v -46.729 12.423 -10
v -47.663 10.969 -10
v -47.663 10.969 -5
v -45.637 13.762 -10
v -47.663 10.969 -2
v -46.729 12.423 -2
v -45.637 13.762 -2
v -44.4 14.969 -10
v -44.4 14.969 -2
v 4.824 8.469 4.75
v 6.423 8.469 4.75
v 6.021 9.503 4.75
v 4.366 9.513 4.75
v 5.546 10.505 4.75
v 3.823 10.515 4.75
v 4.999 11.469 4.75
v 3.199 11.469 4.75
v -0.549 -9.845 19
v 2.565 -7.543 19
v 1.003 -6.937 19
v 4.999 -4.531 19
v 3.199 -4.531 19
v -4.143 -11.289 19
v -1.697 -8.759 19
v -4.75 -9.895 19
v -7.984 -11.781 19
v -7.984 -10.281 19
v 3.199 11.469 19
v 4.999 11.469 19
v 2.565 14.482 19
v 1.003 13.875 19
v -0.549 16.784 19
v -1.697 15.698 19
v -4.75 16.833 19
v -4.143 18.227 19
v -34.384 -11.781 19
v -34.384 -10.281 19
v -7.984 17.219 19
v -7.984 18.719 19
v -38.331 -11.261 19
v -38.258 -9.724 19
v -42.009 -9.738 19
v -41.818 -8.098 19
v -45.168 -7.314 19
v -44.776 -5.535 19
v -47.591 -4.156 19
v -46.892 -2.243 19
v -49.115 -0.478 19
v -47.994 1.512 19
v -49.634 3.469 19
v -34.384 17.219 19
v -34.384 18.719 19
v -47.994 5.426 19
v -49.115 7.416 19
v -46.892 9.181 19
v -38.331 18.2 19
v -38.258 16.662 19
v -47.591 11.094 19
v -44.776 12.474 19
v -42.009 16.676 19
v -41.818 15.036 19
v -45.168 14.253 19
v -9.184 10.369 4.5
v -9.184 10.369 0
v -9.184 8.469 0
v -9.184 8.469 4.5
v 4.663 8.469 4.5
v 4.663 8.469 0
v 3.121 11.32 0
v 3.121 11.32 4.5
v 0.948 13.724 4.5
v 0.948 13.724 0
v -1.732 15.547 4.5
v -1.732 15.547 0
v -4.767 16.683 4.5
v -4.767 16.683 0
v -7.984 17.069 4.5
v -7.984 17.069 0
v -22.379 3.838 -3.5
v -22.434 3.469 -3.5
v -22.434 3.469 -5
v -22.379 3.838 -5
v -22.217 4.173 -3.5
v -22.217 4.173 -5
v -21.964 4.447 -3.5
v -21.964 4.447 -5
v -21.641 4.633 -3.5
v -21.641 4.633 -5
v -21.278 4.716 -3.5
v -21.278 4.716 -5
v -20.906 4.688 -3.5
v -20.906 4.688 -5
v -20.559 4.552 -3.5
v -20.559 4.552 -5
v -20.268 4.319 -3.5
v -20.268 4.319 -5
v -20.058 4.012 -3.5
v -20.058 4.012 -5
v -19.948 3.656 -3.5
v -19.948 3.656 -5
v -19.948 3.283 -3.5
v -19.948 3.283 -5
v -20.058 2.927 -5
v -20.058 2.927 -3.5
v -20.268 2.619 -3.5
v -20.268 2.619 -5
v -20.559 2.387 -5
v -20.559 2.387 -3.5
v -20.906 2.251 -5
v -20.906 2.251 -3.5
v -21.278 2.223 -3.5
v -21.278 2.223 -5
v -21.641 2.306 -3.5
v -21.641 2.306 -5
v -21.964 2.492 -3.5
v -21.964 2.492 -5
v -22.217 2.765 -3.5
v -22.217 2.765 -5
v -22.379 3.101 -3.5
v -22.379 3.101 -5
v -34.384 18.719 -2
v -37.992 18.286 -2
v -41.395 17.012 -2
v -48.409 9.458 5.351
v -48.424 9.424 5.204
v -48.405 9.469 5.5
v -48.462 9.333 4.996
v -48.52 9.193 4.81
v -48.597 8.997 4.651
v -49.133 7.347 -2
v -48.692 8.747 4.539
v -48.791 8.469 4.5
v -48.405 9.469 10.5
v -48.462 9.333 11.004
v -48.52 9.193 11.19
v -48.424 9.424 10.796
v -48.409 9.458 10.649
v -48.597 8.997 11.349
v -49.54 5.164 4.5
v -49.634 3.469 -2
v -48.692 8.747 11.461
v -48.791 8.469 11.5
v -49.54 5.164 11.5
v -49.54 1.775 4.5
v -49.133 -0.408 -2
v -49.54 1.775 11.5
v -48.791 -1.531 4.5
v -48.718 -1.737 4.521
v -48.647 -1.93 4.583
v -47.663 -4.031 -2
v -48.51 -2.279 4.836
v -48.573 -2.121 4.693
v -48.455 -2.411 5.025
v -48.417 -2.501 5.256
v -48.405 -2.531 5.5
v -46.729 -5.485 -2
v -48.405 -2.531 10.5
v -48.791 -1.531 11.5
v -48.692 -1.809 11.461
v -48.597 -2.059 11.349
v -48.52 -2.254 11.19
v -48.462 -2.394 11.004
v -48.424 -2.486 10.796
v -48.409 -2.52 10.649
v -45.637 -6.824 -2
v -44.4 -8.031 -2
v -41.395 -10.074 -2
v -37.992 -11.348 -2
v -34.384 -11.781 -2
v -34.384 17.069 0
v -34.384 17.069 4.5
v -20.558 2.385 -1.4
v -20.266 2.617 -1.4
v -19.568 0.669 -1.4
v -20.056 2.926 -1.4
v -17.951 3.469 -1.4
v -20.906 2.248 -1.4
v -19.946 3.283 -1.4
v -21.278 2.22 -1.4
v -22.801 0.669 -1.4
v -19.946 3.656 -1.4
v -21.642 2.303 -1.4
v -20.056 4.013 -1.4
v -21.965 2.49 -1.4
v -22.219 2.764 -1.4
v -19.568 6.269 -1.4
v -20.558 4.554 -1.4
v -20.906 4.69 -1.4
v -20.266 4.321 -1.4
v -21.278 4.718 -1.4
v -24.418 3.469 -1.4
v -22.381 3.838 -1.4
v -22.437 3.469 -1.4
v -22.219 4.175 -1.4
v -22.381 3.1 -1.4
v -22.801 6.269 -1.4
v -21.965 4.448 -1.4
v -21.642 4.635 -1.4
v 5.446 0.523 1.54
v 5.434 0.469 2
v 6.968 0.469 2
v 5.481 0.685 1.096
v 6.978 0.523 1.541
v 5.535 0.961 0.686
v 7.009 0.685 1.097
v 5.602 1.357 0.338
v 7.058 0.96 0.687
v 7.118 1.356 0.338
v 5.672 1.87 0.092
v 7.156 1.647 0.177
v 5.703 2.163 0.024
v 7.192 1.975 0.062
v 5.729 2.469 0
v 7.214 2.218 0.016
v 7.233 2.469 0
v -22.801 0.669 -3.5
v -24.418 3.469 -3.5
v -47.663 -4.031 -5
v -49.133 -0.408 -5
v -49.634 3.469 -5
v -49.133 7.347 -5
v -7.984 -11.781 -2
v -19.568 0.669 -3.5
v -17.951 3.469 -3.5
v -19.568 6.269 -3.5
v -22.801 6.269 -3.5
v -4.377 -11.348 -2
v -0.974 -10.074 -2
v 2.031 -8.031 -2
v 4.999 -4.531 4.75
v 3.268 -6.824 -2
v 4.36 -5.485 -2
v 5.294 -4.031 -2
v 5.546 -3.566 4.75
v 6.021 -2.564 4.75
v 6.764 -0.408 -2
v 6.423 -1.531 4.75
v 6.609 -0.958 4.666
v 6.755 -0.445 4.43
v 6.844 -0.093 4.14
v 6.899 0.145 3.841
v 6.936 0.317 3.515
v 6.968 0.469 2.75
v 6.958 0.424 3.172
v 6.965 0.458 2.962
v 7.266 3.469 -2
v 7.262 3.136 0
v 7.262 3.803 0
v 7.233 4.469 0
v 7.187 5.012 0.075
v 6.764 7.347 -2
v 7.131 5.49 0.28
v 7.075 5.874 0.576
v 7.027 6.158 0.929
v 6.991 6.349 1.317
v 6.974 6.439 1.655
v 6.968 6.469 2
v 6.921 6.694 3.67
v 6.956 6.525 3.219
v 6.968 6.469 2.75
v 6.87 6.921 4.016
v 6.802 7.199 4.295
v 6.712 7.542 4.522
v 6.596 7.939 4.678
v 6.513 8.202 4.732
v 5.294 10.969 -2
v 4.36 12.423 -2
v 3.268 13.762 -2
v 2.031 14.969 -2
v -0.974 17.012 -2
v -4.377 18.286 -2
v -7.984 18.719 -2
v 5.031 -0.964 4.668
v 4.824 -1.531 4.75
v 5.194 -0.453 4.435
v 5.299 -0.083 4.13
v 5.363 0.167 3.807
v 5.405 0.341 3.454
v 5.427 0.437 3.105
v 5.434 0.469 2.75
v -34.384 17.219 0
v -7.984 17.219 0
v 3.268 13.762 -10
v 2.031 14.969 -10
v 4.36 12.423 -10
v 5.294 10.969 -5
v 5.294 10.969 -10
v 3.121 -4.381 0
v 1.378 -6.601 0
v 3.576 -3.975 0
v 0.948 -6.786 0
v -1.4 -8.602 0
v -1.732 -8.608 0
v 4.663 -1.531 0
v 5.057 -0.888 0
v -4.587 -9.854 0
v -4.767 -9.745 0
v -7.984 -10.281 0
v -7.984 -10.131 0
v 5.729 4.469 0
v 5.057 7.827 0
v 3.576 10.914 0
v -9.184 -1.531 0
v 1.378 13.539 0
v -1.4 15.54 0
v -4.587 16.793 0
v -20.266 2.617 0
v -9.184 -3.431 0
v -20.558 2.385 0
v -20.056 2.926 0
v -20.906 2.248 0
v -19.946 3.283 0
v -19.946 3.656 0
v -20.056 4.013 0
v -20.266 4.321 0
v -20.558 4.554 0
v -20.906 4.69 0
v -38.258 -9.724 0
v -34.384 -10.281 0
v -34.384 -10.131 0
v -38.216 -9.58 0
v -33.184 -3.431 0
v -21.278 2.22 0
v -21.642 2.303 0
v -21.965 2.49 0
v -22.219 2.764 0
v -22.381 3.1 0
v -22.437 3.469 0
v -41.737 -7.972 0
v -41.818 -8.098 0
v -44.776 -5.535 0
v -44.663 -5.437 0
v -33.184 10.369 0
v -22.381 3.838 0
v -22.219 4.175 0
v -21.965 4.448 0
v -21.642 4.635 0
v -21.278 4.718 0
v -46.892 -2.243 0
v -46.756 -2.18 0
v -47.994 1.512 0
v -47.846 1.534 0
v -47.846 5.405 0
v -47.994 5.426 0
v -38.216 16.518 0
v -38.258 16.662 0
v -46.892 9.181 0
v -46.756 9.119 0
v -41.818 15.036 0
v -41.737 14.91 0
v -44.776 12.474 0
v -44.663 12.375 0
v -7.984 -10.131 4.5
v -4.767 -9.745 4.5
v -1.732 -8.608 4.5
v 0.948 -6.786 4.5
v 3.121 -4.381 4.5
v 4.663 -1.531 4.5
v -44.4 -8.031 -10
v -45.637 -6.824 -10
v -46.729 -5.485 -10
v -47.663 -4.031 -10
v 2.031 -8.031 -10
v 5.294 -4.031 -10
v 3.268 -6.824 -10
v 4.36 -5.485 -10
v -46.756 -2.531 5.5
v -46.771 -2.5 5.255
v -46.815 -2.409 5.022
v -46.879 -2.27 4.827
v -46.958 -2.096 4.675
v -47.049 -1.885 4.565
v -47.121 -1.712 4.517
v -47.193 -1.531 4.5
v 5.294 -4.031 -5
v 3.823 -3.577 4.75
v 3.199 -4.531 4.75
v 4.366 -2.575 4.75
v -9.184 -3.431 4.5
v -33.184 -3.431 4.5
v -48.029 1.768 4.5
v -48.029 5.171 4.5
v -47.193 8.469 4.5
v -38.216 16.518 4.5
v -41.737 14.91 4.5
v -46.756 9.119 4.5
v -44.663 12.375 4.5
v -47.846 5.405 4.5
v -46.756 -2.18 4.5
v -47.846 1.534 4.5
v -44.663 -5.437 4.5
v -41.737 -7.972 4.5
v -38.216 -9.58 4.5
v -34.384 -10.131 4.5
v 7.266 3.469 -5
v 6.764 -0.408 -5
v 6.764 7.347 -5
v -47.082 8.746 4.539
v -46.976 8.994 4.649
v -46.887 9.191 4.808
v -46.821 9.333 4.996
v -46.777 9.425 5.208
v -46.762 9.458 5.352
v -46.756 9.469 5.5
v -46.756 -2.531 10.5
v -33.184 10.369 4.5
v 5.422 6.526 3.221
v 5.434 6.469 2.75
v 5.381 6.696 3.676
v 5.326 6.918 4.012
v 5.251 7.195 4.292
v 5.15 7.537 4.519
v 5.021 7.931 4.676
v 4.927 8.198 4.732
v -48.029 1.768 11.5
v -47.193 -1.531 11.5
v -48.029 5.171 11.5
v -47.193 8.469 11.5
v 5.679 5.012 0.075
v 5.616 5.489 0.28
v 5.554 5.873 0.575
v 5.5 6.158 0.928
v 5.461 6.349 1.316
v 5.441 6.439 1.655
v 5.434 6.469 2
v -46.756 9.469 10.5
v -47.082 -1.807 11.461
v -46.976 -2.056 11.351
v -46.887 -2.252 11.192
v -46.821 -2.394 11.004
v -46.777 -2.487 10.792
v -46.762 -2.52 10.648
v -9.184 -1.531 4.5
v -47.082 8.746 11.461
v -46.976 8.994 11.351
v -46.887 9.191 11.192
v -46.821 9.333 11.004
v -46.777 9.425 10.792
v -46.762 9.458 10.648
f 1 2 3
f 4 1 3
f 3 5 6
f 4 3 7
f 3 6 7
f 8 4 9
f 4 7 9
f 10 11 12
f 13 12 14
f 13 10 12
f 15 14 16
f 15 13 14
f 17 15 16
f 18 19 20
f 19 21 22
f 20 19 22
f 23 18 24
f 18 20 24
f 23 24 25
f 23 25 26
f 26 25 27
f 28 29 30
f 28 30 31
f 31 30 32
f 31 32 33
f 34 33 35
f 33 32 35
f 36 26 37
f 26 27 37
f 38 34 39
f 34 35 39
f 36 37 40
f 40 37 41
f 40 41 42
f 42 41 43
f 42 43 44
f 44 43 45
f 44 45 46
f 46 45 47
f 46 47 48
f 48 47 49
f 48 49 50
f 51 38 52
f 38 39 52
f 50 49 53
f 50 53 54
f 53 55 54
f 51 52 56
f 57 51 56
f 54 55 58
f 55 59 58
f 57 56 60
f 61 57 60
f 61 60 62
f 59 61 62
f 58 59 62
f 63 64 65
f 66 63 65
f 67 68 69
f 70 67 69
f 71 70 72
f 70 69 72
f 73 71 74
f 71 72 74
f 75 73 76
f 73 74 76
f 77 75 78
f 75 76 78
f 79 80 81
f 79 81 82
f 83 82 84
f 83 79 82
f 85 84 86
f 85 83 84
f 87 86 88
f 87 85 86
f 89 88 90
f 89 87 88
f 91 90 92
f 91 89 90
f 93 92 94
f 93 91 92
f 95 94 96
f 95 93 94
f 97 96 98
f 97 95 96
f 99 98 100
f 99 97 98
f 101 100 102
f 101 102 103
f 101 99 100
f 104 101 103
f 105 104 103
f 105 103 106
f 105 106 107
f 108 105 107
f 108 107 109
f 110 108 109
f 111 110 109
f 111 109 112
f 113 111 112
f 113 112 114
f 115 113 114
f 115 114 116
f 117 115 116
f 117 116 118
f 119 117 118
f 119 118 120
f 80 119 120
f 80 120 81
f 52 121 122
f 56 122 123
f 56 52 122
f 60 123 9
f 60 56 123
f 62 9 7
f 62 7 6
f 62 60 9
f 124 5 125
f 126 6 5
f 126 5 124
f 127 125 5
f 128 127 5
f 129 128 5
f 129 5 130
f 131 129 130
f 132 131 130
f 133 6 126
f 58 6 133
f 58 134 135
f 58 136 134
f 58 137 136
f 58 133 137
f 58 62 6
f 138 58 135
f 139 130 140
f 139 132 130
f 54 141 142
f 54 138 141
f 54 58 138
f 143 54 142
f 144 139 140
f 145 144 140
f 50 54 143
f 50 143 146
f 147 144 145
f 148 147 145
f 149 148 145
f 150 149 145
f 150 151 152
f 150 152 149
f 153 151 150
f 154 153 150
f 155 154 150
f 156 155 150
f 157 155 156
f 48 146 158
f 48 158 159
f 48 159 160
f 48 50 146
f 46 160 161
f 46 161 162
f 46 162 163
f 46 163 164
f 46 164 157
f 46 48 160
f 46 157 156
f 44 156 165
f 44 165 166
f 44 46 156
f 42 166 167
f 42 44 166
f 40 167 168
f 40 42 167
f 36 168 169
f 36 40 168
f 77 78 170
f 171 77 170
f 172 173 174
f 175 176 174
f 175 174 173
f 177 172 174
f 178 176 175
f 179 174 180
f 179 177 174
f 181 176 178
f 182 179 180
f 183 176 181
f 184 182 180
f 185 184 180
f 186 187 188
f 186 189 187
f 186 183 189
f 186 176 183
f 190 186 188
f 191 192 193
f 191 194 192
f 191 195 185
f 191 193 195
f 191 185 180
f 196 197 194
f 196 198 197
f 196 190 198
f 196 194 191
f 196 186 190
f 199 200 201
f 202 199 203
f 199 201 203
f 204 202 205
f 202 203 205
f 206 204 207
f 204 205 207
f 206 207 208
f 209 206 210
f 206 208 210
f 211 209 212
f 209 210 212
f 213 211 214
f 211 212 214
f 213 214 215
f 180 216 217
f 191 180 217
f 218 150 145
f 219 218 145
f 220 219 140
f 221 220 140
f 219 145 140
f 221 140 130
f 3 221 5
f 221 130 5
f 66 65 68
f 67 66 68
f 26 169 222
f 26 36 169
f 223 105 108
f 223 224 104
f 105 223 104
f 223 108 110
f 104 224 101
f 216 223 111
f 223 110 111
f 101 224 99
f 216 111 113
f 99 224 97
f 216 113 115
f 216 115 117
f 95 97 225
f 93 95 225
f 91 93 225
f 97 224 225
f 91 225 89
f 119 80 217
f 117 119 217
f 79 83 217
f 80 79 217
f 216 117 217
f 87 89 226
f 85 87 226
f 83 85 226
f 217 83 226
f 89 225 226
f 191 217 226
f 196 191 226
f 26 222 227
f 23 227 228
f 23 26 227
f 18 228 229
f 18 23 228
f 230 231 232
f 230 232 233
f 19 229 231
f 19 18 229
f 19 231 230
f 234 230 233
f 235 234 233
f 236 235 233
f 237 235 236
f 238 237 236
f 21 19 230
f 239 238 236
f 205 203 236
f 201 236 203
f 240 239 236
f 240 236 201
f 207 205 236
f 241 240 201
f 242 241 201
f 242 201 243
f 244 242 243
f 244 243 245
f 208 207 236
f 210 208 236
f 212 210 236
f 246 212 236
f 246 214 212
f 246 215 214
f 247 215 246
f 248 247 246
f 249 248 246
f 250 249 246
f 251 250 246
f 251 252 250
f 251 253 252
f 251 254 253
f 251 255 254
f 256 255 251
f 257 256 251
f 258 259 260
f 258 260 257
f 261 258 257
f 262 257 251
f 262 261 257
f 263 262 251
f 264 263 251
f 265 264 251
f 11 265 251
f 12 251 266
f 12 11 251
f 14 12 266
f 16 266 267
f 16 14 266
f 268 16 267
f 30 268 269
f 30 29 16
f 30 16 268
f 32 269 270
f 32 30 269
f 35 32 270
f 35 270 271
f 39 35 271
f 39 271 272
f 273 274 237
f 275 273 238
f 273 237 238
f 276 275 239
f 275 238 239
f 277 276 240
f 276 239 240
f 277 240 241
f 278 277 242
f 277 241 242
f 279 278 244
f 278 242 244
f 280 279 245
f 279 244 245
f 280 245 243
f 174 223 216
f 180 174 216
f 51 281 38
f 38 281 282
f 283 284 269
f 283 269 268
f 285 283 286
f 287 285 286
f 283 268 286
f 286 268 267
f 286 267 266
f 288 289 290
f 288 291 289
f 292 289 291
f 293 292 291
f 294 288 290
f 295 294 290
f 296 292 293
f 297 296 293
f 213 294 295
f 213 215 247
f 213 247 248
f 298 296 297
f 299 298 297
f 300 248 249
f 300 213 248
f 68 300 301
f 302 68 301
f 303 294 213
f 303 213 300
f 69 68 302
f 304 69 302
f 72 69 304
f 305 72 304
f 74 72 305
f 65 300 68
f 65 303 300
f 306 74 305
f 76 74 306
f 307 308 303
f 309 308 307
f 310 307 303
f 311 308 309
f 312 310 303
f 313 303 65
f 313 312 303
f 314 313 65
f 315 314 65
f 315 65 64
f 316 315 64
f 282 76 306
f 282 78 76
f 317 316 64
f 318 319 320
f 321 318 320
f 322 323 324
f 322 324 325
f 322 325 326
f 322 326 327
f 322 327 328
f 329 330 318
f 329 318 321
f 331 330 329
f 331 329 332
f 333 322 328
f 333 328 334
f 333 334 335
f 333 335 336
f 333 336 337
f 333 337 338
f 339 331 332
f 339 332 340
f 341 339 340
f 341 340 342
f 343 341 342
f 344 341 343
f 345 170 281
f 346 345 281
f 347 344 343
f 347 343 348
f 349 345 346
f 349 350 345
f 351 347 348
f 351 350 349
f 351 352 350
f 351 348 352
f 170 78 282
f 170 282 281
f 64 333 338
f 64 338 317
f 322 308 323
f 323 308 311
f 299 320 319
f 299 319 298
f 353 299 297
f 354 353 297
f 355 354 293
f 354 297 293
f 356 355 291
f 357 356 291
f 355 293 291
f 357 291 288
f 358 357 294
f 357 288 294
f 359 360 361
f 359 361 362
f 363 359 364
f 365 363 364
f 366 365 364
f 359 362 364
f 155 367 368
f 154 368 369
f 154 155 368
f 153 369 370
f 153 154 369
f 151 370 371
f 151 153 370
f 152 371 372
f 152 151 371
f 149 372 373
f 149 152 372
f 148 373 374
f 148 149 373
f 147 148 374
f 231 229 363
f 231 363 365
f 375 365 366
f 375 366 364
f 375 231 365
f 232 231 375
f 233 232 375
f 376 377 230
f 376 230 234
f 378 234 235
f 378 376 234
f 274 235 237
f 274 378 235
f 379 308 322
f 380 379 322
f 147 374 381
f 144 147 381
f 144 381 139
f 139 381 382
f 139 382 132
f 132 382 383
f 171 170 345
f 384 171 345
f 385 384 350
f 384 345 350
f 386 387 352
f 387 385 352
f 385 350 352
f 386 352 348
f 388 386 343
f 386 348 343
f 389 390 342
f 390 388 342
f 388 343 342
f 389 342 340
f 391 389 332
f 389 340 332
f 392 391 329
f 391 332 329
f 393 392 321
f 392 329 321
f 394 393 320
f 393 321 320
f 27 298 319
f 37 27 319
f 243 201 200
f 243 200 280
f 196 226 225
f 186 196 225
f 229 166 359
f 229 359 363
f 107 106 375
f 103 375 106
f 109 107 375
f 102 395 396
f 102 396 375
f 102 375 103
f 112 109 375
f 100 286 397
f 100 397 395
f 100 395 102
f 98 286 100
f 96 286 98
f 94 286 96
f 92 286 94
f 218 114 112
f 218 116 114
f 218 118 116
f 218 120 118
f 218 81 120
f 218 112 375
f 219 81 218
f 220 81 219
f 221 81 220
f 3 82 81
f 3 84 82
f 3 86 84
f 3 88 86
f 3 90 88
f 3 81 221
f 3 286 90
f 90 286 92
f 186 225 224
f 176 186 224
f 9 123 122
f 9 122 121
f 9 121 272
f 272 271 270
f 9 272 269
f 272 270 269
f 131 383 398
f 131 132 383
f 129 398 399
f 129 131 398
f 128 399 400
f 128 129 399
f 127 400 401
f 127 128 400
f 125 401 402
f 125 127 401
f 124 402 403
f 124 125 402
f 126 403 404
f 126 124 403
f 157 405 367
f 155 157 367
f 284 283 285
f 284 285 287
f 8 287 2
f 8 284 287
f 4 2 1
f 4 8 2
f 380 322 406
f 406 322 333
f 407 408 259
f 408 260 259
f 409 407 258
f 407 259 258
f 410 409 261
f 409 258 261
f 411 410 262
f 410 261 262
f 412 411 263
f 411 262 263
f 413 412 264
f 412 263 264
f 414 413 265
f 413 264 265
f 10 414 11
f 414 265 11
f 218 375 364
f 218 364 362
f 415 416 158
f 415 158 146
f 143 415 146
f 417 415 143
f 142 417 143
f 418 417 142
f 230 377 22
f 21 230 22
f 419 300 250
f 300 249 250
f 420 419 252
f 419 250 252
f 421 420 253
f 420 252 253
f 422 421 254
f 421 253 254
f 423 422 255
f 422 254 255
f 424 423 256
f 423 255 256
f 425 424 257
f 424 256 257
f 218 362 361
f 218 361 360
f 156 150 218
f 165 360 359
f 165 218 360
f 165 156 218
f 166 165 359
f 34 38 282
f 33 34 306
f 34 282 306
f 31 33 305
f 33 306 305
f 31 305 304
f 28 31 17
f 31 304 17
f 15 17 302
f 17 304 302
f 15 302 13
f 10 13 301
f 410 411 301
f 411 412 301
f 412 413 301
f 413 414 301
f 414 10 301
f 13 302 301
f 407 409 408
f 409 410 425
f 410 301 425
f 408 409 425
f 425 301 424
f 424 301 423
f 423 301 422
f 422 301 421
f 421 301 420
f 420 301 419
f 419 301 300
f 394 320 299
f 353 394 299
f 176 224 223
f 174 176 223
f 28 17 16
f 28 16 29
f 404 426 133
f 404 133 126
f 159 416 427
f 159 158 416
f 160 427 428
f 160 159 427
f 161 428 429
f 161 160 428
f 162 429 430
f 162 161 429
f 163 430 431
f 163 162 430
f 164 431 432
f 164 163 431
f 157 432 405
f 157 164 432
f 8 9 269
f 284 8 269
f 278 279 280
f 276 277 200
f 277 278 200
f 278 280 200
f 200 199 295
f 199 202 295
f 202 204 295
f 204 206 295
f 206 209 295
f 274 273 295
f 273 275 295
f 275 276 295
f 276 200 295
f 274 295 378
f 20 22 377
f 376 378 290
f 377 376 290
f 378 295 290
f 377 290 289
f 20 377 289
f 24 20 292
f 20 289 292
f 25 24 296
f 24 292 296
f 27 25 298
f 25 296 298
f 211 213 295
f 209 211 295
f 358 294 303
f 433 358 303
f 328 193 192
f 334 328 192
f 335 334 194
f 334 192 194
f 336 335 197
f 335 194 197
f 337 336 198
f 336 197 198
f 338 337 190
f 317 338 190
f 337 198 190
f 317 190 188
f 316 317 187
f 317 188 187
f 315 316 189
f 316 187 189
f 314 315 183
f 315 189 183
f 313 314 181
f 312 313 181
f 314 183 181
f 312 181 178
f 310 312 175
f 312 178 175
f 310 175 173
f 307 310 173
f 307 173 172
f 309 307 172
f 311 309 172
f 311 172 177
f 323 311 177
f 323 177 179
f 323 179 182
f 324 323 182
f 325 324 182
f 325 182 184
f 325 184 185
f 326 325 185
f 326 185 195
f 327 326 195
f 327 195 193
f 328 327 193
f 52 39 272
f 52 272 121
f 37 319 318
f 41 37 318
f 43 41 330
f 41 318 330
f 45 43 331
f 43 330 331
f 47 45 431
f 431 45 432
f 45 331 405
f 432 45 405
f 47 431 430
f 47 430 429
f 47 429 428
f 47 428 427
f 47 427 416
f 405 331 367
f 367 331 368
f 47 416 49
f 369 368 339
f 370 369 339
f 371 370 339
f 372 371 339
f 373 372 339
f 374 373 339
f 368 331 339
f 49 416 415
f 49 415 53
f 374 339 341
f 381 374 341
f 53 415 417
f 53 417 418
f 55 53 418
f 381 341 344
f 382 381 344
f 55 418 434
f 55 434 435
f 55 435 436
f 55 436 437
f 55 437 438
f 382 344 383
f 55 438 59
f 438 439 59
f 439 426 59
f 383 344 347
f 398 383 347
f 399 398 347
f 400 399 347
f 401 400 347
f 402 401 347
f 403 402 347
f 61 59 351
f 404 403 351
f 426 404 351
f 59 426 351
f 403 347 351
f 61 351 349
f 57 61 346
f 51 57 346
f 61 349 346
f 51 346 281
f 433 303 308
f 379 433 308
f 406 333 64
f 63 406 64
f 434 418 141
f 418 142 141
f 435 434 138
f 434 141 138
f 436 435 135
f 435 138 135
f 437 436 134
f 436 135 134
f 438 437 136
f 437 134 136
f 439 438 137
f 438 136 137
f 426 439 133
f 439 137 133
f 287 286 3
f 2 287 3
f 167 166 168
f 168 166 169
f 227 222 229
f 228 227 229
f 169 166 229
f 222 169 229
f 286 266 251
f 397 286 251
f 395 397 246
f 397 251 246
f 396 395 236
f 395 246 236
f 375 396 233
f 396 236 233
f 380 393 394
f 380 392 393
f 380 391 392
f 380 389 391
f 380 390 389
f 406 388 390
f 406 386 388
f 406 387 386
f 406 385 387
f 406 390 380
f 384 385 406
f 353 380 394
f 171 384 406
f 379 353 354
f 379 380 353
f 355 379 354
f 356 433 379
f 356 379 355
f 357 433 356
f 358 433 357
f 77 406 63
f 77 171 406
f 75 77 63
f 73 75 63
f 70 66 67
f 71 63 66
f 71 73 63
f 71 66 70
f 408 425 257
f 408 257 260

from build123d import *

# Parameters (mm, degrees)
BOSS_EXTRUDE1_DEPTH = 19
BOSS_EXTRUDE2_DEPTH = 2
BOSS_EXTRUDE3_DEPTH = 4.5
SKETCH4_W           = 4.75
SKETCH4_H           = 6
SKETCH4_W_2         = 14.25
SKETCH4_H_2         = 16
CUT_EXTRUDE1_DEPTH  = 49.452157546
SKETCH5_W           = 7
SKETCH5_H           = 12
CUT_EXTRUDE2_DEPTH  = 49.452157546
FILLET1_R           = 1
SKETCH6_R           = 1.25
BOSS_EXTRUDE4_DEPTH = 3
BOSS_EXTRUDE7_DEPTH = 8
FILLET2_R           = 2
SKETCH9_R           = 1.252428217
CUT_EXTRUDE3_DEPTH  = 10
CUT_EXTRUDE6_START  = -1.5
CUT_EXTRUDE6_DEPTH  = 2.1


with BuildPart() as part:
    # Sketch1 → Boss-Extrude1 (new body)
    with BuildSketch(Plane.XY):
        with BuildLine():
            Line((-34.384444189, 18.719216619), (-7.984444189, 18.719216619))
            ThreePointArc((-7.984444189, 18.719216619), (7.265555811, 3.469216619), (-7.984444189, -11.780783381))
            Line((-7.984444189, -11.780783381), (-34.384444189, -11.780783381))
            ThreePointArc((-34.384444189, -11.780783381), (-49.634444189, 3.469216619), (-34.384444189, 18.719216619))
        make_face()
        with BuildLine():
            Line((-34.384444189, 17.219216619), (-7.984444189, 17.219216619))
            ThreePointArc((-7.984444189, 17.219216619), (5.765555811, 3.469216619), (-7.984444189, -10.280783381))
            Line((-7.984444189, -10.280783381), (-34.384444189, -10.280783381))
            ThreePointArc((-34.384444189, -10.280783381), (-48.134444189, 3.469216619), (-34.384444189, 17.219216619))
        make_face(mode=Mode.SUBTRACT)
    extrude(amount=BOSS_EXTRUDE1_DEPTH)



with BuildPart() as body_2:
    # Sketch2 → Boss-Extrude2 (new body)
    with BuildSketch(Plane(origin=(0, 0, 0), x_dir=(-1, 0, 0), z_dir=(0, 0, -1))):
        with BuildLine():
            Line((34.384444189, -11.780783381), (7.984444189, -11.780783381))
            ThreePointArc((7.984444189, -11.780783381), (-7.265555811, 3.469216619), (7.984444189, 18.719216619))
            Line((7.984444189, 18.719216619), (34.384444189, 18.719216619))
            ThreePointArc((34.384444189, 18.719216619), (49.634444189, 3.469216619), (34.384444189, -11.780783381))
        make_face()
    extrude(amount=BOSS_EXTRUDE2_DEPTH)


with BuildPart() as part_1:
    add(part.part)

    add(body_2.part)  # Boss-Extrude3 merges body 2
    # Sketch3 → Boss-Extrude3 (add)
    with BuildSketch(Plane.XY):
        with BuildLine():
            Line((-22.664695889, -3.430783381), (-33.184444189, -3.430783381))
            Line((-33.184444189, -3.430783381), (-33.184444189, 10.369216619))
            Line((-33.184444189, 10.369216619), (-19.704192488, 10.369216619))
            Line((-19.704192488, 10.369216619), (-9.184444189, 10.369216619))
            Line((-9.184444189, 10.369216619), (-9.184444189, 8.469216619))
            Line((-9.184444189, 8.469216619), (4.663184056, 8.469216619))
            ThreePointArc((4.663184056, 8.469216619), (-0.337155761, 14.715615149), (-7.984444189, 17.069308538))
            Line((-7.984444189, 17.069308538), (-34.384444189, 17.069308538))
            ThreePointArc((-34.384444189, 17.069308538), (-47.984536108, 3.469216619), (-34.384444189, -10.1308753))
            Line((-34.384444189, -10.1308753), (-7.984444189, -10.1308753))
            ThreePointArc((-7.984444189, -10.1308753), (-0.337155761, -7.777181911), (4.663184056, -1.530783381))
            Line((4.663184056, -1.530783381), (-9.184444189, -1.530783381))
            Line((-9.184444189, -1.530783381), (-9.184444189, -3.430783381))
            Line((-9.184444189, -3.430783381), (-19.704192488, -3.430783381))
            Line((-19.704192488, -3.430783381), (-22.664695889, -3.430783381))
        make_face()
    extrude(amount=BOSS_EXTRUDE3_DEPTH)

    # Sketch4 → Cut-Extrude1 (cut, through all)
    with BuildSketch(Plane.ZY.offset(9.184444189)):
        with Locations((2.375, 3.469216619)):
            Rectangle(SKETCH4_W, SKETCH4_H)
        with Locations((11.875, 3.469216619)):
            Rectangle(SKETCH4_W_2, SKETCH4_H_2)
    extrude(amount=-CUT_EXTRUDE1_DEPTH, mode=Mode.SUBTRACT)

    # Sketch5 → Cut-Extrude2 (cut, through all)
    with BuildSketch(Plane(origin=(-33.184444189, 0, 0), x_dir=(0, 0, -1), z_dir=(1, 0, 0))):
        with Locations((-8, 3.469216619)):
            Rectangle(SKETCH5_W, SKETCH5_H)
    extrude(amount=-CUT_EXTRUDE2_DEPTH, mode=Mode.SUBTRACT)

    # Fillet1
    fillet1_edges = [part_1.edges().sort_by_distance(p)[0] for p in [
        (-47.580403151, -2.530783381, 11.5),
        (-47.580403151, 9.469216619, 11.5),
        (-47.580403151, 9.469216619, 4.5),
        (-47.580403151, -2.530783381, 4.5),
    ]]
    fillet(fillet1_edges, radius=FILLET1_R)

    # Sketch6 → Boss-Extrude4 (add)
    with BuildSketch(Plane(origin=(0, 0, -2), x_dir=(-1, 0, 0), z_dir=(0, 0, -1))):
        with BuildLine():
            ThreePointArc((47.662715914, -4.030783381), (49.634444189, 3.469216619), (47.662715914, 10.969216619))
            Line((47.662715914, 10.969216619), (-5.293827536, 10.969216619))
            ThreePointArc((-5.293827536, 10.969216619), (-7.265555811, 3.469216619), (-5.293827536, -4.030783381))
            Line((-5.293827536, -4.030783381), (47.662715914, -4.030783381))
        make_face()
        with Locations((21.184444189, 3.469216619)):
            Circle(SKETCH6_R, mode=Mode.SUBTRACT)
    extrude(amount=BOSS_EXTRUDE4_DEPTH)

    # Sketch10 → Boss-Extrude7 (add)
    with BuildSketch(Plane(origin=(0, 0, -2), x_dir=(-1, 0, 0), z_dir=(0, 0, -1))):
        with BuildLine():
            Line((-5.293827536, -4.030783381), (47.662715914, -4.030783381))
            ThreePointArc((47.662715914, -4.030783381), (46.201857789, -6.169830834), (44.400057001, -8.030783381))
            Line((44.400057001, -8.030783381), (-2.031168623, -8.030783381))
            ThreePointArc((-2.031168623, -8.030783381), (-3.832969412, -6.169830834), (-5.293827536, -4.030783381))
        make_face()
        with BuildLine():
            Line((-5.293827536, 10.969216619), (47.662715914, 10.969216619))
            ThreePointArc((47.662715914, 10.969216619), (46.201857789, 13.108264072), (44.400057001, 14.969216619))
            Line((44.400057001, 14.969216619), (-2.031168623, 14.969216619))
            ThreePointArc((-2.031168623, 14.969216619), (-3.832969412, 13.108264072), (-5.293827536, 10.969216619))
        make_face()
    extrude(amount=BOSS_EXTRUDE7_DEPTH)

    # Fillet2
    fillet2_edges = [part_1.edges().sort_by_distance(p)[0] for p in [
        (6.200927538, 0.469216619, 0),
        (6.200927538, 6.469216619, 0),
        (6.200927538, 6.469216619, 4.75),
        (6.200927538, 0.469216619, 4.75),
    ]]
    fillet(fillet2_edges, radius=FILLET2_R)

    # Sketch9 → Cut-Extrude3 (cut)
    with BuildSketch(Plane(origin=(0, 0, -2), x_dir=(-1, 0, 0), z_dir=(0, 0, -1))):
        with Locations((21.184444189, 3.469216619)):
            Circle(SKETCH9_R)
    extrude(amount=-CUT_EXTRUDE3_DEPTH, mode=Mode.SUBTRACT)

    # Sketch13 → Cut-Extrude6 (cut)
    with BuildSketch(Plane(origin=(0, 0, -5), x_dir=(-1, 0, 0), z_dir=(0, 0, -1)).offset(CUT_EXTRUDE6_START)):
        Polygon((17.951282681, 3.469216619), (19.567863435, 0.669216619), (22.801024943, 0.669216619), (24.417605696, 3.469216619), (22.801024943, 6.269216619), (19.567863435, 6.269216619), align=None)
    extrude(amount=-CUT_EXTRUDE6_DEPTH, mode=Mode.SUBTRACT)


solid = part_1.part
